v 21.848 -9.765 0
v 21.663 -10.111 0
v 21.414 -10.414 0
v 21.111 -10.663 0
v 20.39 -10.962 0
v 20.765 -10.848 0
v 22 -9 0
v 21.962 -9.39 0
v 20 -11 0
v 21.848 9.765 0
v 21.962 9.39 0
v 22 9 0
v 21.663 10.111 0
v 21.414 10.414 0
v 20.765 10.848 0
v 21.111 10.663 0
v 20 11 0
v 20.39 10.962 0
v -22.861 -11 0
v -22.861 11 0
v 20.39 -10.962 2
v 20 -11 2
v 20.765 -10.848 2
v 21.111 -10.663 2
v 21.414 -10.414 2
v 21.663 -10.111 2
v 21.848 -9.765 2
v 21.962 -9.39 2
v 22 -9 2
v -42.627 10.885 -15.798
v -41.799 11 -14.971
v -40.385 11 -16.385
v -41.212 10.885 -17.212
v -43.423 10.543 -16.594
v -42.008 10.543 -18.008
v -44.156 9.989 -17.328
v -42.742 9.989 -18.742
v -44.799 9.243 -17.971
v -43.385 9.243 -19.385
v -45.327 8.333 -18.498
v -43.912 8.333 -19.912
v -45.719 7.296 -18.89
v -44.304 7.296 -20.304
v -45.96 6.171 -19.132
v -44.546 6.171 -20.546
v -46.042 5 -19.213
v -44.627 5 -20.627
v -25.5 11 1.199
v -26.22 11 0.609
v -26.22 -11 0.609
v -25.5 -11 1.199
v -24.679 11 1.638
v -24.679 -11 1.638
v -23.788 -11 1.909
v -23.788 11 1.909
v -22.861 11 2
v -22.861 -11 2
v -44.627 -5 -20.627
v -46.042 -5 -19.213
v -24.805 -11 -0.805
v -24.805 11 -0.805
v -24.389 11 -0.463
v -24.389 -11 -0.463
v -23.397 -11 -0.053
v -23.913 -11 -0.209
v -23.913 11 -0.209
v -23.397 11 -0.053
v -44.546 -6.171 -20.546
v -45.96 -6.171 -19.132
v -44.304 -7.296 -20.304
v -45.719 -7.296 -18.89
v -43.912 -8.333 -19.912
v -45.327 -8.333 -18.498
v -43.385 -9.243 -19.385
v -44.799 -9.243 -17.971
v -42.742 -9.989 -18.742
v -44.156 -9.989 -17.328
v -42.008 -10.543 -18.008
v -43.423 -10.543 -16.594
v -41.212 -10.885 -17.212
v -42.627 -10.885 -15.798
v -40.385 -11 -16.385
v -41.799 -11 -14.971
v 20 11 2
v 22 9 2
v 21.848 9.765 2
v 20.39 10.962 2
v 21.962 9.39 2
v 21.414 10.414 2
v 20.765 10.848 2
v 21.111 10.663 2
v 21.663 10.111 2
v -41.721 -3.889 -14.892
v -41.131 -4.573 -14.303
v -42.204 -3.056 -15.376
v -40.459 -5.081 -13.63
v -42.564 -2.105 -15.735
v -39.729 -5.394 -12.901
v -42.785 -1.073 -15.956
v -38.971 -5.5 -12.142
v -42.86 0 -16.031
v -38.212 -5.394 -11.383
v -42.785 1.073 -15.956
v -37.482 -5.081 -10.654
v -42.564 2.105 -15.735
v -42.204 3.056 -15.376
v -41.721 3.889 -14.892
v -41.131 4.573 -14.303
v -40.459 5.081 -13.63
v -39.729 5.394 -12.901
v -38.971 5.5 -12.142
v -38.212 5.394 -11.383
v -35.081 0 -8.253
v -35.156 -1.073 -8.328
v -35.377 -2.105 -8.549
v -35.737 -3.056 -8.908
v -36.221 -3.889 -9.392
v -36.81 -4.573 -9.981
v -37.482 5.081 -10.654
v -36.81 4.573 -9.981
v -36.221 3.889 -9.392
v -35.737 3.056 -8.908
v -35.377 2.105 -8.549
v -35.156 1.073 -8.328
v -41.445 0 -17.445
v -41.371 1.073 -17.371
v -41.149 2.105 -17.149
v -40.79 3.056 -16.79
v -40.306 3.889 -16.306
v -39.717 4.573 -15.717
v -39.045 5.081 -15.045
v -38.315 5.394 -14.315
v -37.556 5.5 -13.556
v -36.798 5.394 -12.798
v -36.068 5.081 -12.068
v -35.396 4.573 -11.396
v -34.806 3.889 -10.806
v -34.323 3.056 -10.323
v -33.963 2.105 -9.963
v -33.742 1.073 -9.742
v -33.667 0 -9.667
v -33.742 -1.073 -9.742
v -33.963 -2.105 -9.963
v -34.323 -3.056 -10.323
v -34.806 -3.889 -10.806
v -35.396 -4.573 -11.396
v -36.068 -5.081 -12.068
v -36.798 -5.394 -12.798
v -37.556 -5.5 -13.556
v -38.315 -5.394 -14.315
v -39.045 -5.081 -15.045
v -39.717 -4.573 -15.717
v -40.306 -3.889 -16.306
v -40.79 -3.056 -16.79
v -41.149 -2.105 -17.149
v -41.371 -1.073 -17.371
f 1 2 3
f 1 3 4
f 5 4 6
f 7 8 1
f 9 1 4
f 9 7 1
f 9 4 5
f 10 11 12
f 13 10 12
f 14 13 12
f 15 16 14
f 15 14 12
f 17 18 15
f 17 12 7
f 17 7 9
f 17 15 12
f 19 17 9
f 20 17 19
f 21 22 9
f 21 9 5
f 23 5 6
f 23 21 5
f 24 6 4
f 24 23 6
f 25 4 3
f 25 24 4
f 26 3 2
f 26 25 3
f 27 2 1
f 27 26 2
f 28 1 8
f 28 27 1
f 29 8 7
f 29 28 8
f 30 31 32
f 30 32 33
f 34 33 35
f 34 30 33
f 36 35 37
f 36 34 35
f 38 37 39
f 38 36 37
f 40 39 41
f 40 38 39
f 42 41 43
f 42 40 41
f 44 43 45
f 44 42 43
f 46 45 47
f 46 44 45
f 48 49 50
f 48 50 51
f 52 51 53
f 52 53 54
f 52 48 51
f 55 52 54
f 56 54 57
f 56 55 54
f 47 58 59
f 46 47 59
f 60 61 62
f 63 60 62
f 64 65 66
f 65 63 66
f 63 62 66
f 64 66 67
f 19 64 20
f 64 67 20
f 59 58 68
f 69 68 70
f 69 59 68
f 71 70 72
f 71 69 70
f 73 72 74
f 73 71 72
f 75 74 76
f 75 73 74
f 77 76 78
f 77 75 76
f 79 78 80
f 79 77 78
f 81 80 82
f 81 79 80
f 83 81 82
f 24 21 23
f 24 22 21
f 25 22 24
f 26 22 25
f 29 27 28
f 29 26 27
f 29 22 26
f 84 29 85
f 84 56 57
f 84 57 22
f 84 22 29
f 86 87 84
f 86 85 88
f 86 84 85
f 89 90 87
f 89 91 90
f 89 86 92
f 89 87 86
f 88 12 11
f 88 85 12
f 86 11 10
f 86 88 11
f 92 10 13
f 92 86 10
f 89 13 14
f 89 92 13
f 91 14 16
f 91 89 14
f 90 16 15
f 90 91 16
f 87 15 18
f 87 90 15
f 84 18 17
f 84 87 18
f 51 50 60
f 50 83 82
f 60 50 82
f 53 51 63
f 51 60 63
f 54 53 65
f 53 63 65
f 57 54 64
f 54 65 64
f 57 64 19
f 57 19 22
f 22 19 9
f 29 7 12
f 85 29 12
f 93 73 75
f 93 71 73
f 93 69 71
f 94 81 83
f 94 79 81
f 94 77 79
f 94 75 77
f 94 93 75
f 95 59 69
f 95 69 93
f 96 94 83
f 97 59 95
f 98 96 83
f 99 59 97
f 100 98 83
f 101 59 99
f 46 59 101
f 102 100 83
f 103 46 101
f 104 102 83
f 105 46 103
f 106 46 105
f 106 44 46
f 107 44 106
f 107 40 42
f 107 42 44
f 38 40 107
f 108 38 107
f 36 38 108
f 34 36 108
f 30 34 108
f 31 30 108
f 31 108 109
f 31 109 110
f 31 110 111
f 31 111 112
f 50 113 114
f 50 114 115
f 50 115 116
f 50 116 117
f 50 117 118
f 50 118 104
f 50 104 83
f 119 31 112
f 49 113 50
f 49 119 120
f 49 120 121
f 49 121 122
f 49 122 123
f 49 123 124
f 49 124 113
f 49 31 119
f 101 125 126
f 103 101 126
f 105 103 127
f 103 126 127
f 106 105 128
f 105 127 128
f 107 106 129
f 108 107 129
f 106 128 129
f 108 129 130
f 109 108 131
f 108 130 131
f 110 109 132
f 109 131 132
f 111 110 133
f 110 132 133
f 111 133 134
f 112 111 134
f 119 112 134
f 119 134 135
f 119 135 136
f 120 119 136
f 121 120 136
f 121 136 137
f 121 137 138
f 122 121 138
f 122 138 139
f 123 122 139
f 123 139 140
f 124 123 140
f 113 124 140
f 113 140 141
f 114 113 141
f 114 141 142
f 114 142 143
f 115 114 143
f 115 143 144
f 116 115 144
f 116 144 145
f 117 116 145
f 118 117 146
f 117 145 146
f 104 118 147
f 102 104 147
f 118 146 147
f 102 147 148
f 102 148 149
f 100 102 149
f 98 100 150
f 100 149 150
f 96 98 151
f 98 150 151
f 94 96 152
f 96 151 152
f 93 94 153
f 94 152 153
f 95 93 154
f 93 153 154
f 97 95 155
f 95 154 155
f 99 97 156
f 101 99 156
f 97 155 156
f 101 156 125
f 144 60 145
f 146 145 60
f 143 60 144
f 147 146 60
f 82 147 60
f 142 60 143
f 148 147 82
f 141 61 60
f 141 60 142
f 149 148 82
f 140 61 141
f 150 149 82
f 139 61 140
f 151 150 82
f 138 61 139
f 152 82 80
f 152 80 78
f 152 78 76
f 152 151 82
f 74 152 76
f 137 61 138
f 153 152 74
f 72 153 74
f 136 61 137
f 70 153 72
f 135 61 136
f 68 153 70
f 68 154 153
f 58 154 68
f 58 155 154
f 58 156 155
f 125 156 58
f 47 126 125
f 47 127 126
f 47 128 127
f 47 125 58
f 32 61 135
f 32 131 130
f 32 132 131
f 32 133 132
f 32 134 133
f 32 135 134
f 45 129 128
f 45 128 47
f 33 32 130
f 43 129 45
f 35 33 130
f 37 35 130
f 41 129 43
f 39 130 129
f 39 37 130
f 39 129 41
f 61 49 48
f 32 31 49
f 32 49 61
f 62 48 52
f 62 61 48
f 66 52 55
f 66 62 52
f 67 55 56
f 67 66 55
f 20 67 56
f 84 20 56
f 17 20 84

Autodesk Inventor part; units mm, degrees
ref_plane "YZ Plane" through (0, 0, 0) normal (1, 0, 0) x (0, 1, 0)
ref_plane "XZ Plane" through (0, 0, 0) normal (0, 1, 0) x (-1, 0, 0)
ref_plane "XY Plane" through (0, 0, 0) normal (0, 0, 1) x (1, 0, 0)
sketch "Sketch1" plane through (0, 0, 0) normal (0, 0, 1) x (1, 0, 0)
  line L0 (-22, -11) -> (22, -11)
  line L1 (22, -11) -> (22, 11)
  line L2 (22, 11) -> (-22, 11)
  line L3 (-22, 11) -> (-22, -11)
  line L4 (-22, -11) -> (22, 11) construction
  line L5 (22, -11) -> (-22, 11) construction
  point P0 (0, 0)
  dimension "d154" = 44
  dimension "d155" = 22
extrude "Plate5" add sketch "Sketch1" along normal blind 2
fillet "Corner Round1" radius 2 2 edges at (22, 11, 1) (22, -11, 1)
sketch "Sketch10" plane through (-23.4142, 11, 3.4142) normal (0.7071068, 0, -0.7071068) x (0, 1, 0)
  line L0 (-22, 0) -> (0, 0)
  line L1 (0, 0) -> (0, -32)
  line L2 (0, -32) -> (-22, -32)
  line L3 (-22, -32) -> (-22, 0)
edge flange "Flange4" height 30 angle 45 thickness 2 bend radius 2.75 thickness toward (0.7071068, 0, -0.7071068) relief round relief width 2 relief depth 1 edges at (-22, 0, 0) wall of the first edge with corners at (-23.4142, -11, 3.4142) (-23.4142, 11, 3.4142) (-46.0416, 11, -19.2132) (-46.0416, -11, -19.2132)
bend "Bend4"
corner "Corner4"
sketch "Sketch11" plane through (-44.6274, -11, -20.6274) normal (0.7071068, 0, -0.7071068) x (-0.7071068, 0, -0.7071068)
  line L0 (-28.0325, 22) -> (-28.0325, 0) construction
  line L1 (0, 0) -> (-28.0325, 0) construction
  line L2 (0, 0) -> (0, 22) construction
  line L3 (0, 22) -> (-28.0325, 22) construction
  circle A0 centre (-10, 11) radius 5.5
  point P0 (-46.1421, 11)
  point P1 (0, 11)
  dimension "d192" = 11
  dimension "d193" = 10
extrude "Cut3" cut sketch "Sketch11" against normal blind 2
fillet "Corner Round3" radius 6 2 edges at (-45.3345, 11, -19.9203) (-45.3345, -11, -19.9203)
properties part number "TKS 3563 FDS support cup" material "Stainless Steel"
